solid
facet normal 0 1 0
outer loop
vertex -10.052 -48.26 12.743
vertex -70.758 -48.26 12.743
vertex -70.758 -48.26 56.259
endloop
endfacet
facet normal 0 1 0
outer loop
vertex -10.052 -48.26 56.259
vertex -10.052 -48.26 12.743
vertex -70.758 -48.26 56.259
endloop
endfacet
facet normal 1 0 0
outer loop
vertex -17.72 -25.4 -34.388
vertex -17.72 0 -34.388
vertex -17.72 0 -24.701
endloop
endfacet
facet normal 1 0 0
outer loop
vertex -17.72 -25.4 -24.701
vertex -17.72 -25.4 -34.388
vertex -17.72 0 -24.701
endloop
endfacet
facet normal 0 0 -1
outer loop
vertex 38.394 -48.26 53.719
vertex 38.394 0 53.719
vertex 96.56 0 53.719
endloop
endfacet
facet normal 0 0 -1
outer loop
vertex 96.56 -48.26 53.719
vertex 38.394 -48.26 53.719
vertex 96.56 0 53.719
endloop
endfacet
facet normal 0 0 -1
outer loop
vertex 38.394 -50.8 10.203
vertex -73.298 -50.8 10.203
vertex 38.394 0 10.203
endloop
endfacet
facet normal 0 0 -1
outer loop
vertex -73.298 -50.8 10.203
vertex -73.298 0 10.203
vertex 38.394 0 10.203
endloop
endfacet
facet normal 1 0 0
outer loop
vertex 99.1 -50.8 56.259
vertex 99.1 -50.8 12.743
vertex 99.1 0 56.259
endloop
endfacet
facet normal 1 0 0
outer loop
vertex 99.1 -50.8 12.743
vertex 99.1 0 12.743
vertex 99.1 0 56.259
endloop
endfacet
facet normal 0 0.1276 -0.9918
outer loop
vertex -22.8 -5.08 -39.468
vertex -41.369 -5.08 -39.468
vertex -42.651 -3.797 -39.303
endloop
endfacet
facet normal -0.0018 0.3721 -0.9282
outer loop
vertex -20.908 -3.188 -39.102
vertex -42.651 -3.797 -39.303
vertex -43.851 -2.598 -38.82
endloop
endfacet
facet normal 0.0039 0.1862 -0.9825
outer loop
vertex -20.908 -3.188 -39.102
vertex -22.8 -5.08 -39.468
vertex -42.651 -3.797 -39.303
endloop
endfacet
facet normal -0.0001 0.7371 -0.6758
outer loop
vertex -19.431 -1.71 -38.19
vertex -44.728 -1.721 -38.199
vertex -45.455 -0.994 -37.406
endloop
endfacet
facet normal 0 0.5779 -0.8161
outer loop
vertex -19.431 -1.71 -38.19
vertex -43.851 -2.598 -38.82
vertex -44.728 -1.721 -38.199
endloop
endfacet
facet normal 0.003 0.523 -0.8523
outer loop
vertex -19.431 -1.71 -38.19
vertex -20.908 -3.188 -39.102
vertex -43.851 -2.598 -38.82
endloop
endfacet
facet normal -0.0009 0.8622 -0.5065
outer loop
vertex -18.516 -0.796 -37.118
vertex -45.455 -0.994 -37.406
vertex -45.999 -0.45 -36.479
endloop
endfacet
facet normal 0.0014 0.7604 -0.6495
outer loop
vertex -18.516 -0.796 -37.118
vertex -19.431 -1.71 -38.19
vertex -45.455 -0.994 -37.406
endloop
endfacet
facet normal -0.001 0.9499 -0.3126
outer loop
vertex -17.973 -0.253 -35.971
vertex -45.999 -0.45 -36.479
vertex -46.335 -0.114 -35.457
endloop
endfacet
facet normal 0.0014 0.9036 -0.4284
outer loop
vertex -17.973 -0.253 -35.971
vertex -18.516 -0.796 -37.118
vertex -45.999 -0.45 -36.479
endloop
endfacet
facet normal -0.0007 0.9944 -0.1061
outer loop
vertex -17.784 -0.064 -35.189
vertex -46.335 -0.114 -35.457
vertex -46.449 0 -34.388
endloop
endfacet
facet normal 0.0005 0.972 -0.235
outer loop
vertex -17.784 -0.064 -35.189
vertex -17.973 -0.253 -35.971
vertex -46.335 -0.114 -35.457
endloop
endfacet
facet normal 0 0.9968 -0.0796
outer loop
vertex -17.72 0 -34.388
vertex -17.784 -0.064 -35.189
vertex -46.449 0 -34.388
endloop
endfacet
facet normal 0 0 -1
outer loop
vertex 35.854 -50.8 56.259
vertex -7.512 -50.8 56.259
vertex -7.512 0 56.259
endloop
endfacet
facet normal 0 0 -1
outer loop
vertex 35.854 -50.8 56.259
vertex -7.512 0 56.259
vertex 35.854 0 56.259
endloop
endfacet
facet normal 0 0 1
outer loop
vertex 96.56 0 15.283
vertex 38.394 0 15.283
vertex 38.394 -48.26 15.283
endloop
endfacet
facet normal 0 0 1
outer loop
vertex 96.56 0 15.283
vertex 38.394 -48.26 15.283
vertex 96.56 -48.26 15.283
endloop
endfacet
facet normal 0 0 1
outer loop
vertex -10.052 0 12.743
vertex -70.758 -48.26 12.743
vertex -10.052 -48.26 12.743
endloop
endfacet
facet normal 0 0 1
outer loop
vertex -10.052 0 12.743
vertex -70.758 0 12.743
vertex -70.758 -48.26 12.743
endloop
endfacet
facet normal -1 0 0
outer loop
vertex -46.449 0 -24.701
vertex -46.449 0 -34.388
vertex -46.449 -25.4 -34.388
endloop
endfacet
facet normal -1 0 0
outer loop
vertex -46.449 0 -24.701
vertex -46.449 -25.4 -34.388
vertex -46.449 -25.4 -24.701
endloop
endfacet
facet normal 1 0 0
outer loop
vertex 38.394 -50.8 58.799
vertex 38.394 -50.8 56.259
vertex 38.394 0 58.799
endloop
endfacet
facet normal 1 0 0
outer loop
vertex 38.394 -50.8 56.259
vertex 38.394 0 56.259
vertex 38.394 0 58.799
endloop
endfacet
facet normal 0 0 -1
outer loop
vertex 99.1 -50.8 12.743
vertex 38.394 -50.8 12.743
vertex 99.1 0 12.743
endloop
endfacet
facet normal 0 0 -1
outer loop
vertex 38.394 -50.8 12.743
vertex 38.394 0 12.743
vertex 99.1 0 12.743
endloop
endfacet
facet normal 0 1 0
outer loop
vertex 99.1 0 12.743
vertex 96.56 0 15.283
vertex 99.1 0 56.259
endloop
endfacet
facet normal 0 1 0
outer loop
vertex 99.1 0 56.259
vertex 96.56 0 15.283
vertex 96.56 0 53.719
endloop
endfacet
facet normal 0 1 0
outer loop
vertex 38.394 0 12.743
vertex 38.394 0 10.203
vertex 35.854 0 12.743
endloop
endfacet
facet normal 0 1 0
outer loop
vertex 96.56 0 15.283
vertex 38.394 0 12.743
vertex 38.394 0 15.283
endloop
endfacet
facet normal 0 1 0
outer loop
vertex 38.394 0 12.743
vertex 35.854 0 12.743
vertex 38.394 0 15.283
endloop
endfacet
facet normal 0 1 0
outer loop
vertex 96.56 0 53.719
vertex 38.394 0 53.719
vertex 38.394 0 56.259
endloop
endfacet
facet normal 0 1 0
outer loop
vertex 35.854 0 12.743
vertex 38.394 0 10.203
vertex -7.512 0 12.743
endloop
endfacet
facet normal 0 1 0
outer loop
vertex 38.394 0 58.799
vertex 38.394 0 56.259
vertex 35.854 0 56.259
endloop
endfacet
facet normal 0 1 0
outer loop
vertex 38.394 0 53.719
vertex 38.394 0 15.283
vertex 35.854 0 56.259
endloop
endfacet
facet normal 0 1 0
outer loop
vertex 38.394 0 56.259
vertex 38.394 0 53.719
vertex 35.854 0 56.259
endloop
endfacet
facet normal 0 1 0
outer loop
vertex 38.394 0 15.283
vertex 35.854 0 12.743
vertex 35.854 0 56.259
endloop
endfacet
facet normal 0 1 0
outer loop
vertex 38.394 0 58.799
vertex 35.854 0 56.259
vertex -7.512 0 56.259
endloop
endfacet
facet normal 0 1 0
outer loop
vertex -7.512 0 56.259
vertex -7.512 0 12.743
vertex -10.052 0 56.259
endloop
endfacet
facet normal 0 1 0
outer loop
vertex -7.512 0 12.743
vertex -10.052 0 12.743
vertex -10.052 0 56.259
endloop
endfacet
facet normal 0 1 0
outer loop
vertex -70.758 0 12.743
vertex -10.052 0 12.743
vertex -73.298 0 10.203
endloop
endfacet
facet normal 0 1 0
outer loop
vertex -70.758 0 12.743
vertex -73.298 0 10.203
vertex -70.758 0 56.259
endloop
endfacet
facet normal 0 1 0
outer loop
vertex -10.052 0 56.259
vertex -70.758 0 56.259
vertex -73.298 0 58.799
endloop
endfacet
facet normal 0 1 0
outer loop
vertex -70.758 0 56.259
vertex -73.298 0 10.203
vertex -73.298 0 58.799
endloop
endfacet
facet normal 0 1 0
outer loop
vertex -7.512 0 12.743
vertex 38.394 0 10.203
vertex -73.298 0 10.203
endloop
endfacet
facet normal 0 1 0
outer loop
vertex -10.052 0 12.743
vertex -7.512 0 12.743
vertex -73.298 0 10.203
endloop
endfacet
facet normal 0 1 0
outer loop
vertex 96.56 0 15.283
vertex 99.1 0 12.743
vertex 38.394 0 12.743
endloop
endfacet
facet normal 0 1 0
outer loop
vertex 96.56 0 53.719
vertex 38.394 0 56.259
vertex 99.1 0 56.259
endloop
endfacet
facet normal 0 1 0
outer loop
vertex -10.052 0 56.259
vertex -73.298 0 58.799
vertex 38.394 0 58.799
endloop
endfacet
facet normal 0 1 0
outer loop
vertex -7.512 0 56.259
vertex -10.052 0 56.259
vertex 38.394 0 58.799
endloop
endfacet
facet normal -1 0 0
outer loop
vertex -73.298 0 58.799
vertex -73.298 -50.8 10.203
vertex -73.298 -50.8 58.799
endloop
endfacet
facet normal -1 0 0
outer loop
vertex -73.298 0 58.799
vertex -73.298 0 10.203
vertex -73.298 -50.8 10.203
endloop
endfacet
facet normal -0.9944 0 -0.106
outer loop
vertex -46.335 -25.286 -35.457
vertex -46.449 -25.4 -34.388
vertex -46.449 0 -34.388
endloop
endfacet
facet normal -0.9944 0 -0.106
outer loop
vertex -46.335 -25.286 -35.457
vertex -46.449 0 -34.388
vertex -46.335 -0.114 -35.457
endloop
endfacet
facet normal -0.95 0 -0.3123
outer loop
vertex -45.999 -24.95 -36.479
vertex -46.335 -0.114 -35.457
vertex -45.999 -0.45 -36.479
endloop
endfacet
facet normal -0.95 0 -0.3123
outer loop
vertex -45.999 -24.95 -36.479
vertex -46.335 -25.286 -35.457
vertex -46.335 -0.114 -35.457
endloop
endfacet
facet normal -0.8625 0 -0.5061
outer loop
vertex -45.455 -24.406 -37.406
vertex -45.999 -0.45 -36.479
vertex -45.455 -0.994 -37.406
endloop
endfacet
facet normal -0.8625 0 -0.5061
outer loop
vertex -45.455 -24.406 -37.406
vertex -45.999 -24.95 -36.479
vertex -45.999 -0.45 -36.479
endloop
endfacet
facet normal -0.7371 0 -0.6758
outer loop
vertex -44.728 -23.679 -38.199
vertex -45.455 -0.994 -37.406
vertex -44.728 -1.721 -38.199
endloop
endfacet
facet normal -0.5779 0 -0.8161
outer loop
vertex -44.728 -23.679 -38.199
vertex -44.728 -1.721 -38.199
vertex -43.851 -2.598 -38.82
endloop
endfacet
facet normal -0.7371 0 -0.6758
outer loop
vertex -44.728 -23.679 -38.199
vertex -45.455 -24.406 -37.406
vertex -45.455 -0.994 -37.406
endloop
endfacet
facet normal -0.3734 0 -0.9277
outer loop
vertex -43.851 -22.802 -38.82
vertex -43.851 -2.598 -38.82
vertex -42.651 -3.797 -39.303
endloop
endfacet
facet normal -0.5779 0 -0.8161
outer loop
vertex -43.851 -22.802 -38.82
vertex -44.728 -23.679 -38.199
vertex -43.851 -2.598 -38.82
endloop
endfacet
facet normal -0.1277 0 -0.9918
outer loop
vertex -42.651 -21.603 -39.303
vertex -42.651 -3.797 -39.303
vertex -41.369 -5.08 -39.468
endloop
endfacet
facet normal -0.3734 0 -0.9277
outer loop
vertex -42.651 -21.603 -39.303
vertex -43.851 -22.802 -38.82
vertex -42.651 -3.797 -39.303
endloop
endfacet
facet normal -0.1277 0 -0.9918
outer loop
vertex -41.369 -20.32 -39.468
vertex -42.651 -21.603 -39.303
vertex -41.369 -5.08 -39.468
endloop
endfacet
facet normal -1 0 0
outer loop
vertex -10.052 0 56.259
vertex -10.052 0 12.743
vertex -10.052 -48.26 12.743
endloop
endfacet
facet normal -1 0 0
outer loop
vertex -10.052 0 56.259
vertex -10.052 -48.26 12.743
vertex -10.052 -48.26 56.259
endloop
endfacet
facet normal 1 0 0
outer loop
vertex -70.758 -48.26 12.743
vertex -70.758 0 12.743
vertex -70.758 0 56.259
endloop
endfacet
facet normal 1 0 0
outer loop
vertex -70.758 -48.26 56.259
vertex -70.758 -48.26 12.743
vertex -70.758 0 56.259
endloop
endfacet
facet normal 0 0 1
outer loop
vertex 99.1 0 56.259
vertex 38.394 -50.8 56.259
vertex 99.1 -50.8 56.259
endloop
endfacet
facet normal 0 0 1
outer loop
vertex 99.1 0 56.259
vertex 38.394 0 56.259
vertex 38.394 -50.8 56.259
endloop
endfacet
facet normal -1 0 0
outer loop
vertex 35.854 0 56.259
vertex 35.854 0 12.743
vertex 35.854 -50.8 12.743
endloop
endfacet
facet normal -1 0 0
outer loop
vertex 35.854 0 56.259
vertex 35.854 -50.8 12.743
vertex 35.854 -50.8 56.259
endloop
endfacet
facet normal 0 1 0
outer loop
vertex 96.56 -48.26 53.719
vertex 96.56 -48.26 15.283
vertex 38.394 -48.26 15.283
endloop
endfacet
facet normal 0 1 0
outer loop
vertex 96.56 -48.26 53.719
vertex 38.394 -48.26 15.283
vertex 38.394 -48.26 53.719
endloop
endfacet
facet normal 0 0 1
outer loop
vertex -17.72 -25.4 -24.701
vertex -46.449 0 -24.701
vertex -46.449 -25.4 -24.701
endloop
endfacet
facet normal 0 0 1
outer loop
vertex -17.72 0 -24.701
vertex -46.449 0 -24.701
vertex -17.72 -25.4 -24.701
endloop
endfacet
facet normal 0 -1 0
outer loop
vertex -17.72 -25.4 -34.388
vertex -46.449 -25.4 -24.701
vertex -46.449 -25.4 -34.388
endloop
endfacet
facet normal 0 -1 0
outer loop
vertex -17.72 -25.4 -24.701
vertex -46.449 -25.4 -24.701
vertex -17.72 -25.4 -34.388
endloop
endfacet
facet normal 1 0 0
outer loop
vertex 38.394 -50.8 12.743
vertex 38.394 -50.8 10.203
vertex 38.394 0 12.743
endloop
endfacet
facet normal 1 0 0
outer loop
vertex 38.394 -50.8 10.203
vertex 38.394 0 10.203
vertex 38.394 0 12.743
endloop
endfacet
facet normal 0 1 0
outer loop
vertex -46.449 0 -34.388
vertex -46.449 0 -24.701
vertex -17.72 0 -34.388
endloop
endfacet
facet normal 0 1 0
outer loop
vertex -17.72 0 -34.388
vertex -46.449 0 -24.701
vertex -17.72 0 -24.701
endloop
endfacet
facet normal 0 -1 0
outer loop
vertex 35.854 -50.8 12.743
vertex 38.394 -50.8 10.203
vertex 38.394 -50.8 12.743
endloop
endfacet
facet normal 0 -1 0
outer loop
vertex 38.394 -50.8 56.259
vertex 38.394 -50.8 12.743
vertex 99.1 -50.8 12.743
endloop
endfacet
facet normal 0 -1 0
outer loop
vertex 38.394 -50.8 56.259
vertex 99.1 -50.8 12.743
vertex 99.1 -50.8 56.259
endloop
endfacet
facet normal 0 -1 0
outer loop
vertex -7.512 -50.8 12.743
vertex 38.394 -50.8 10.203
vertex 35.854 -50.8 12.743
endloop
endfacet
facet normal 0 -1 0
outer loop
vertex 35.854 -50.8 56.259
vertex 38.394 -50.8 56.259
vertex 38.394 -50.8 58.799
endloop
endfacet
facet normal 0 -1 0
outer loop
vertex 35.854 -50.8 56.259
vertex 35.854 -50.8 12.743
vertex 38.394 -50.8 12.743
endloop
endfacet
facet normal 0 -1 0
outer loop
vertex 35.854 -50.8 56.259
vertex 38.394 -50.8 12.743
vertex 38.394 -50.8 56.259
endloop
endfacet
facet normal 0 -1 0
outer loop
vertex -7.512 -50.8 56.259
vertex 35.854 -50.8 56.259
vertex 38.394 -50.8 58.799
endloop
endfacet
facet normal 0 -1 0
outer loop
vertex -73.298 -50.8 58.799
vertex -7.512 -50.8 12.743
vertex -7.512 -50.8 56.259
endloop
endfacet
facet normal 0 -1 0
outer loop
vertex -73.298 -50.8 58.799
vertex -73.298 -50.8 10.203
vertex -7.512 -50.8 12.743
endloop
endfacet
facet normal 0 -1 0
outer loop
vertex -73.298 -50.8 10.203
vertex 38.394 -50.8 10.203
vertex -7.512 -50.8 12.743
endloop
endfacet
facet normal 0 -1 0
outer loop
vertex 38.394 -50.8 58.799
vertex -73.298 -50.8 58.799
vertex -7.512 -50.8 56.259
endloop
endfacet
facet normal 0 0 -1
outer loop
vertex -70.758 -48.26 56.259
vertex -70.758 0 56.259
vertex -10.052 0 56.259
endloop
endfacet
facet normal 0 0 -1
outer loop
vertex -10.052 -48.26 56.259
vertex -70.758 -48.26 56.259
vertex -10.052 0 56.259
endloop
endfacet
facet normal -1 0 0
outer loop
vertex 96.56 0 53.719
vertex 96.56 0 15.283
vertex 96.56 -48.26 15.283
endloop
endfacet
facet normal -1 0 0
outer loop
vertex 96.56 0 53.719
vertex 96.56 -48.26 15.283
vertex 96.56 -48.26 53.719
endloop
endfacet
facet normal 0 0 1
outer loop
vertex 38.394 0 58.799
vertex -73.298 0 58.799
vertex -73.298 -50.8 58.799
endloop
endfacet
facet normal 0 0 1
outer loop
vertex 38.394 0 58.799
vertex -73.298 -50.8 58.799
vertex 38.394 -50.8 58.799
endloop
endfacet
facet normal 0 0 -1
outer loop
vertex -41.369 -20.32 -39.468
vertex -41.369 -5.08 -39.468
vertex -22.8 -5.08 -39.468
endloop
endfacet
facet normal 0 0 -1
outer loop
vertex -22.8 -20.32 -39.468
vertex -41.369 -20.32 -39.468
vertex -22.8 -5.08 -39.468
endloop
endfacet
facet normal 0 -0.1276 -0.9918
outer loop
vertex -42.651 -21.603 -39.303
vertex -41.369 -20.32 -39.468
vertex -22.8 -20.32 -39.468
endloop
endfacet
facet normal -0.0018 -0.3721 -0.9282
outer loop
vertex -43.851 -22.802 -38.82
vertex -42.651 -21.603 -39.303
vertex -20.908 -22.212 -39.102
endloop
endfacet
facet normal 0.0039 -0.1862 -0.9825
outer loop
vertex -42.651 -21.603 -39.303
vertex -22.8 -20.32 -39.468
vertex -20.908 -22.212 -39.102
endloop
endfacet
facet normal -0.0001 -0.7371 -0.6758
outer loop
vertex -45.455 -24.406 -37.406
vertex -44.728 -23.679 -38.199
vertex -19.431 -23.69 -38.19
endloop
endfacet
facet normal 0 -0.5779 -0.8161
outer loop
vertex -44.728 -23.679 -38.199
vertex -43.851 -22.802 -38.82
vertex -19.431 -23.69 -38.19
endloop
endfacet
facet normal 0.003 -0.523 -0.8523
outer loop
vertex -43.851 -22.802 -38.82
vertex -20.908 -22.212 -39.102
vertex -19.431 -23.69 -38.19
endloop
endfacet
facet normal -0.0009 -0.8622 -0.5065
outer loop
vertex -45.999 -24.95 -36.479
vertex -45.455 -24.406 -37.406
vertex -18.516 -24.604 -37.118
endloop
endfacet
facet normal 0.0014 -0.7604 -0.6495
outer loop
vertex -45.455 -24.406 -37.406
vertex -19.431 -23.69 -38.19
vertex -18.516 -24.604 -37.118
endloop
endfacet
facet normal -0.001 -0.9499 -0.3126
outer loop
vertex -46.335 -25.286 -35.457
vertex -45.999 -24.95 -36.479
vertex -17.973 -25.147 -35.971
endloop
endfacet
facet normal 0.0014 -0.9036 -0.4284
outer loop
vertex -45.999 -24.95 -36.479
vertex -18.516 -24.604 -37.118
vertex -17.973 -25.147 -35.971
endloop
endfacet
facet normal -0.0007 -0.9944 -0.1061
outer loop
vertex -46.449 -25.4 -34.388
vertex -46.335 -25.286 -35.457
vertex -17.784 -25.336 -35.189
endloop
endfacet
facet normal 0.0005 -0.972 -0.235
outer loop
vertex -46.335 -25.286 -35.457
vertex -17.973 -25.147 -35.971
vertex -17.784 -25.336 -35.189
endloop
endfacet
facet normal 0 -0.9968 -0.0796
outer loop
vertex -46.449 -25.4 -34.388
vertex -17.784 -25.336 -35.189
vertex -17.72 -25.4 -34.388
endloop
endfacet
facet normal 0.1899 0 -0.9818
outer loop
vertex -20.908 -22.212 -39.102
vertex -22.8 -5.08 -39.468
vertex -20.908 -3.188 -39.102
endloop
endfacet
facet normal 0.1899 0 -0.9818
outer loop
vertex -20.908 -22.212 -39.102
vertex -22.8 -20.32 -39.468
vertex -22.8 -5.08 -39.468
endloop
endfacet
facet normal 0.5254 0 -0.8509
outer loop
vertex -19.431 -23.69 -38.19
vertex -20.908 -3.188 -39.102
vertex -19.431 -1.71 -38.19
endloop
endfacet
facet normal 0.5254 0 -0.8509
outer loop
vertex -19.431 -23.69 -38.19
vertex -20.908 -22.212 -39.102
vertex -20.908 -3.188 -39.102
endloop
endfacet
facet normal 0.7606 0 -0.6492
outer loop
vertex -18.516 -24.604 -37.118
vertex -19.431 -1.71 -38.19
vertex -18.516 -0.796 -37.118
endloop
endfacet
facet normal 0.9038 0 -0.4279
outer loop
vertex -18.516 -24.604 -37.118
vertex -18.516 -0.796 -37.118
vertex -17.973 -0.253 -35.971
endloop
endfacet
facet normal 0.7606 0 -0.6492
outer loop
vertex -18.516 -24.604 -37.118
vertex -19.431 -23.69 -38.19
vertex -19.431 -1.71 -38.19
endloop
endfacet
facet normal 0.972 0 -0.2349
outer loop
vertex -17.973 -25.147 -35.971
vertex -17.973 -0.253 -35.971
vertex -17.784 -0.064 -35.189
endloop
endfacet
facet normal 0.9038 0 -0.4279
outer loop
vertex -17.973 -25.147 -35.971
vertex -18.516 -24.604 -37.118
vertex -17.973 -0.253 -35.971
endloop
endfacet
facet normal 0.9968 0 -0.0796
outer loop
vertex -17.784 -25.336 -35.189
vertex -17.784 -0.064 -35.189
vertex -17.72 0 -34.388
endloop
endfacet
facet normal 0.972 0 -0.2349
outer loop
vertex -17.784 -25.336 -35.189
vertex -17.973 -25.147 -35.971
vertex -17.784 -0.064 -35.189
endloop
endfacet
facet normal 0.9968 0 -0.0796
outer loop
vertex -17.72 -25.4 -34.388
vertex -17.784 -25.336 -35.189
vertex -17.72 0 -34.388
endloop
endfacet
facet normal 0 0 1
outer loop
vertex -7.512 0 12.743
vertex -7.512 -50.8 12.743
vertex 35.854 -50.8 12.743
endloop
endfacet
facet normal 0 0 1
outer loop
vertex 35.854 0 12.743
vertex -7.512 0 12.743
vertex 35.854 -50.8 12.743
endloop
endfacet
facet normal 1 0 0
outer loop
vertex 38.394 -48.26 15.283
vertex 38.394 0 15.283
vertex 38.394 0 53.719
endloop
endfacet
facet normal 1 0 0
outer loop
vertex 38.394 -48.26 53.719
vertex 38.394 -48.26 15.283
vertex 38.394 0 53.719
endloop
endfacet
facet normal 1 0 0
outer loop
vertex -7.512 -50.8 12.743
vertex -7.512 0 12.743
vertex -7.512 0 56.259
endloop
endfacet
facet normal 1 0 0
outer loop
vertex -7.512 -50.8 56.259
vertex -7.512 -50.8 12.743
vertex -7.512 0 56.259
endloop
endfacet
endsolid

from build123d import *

# Parameters (mm, degrees)
F0_W        = 111.691813916
F0_H        = 48.596679233
F1_DEPTH    = 25.4
F0_W_2      = 28.7284236401
F0_H_2      = 14.766946435
F2_T        = -2.54
F3_DEPTH    = 63.246
F4_DEPTH    = 25.4
F5_T        = 2.54
F5_T3_DEPTH = 55.88
F6_R        = 5.08


# Not quite as in the source:
# - a shell that OpenCascade refuses in one call is made with other operations: the cavity is built on its own and cut out


with BuildPart() as f1:
    # F0 (on Front) → F1 (new body)
    with BuildSketch(Plane.XZ):
        with Locations((-17.4518469721, 34.500957001)):
            Rectangle(F0_W, F0_H)
    extrude(amount=F1_DEPTH)

    # F2
    f2_openings = [f1.faces().sort_by_distance(p)[0] for p in [
        (-17.451847, -25.4, 34.500957),
        (-17.451847, 0, 34.500957),
    ]]
    offset(amount=F2_T, openings=f2_openings)

    # F3 (add): faces of the model
    f3_faces = [f1.faces().sort_by_distance(p)[0] for p in [
        (-70.7577539301, -12.7, 34.500957001),
        (35.8540599859, -12.7, 34.500957001),
    ]]
    extrude(f3_faces, amount=F3_DEPTH, dir=(1, 0, 0))

    # F4 (add): a face of the model
    f4_faces = [f1.faces().sort_by_distance(p)[0] for p in [
        (36.602897138, -25.4, 57.5292966175),
    ]]
    extrude(f4_faces, amount=F4_DEPTH)

    # F5: shell of thickness 2.54, made by hand


with BuildPart() as f1b:
    # F0 (on Front) → F1, piece 2 (new body)
    with BuildSketch(Plane.XZ):
        with Locations((-32.0845479146, -32.0845469832)):
            Rectangle(F0_W_2, F0_H_2)
    extrude(amount=F1_DEPTH)

    # F6
    f6_edges = [f1b.edges().sort_by_distance(p)[0] for p in [
        (-46.44876, -12.7, -39.46802),
        (-17.720336, -12.7, -39.46802),
        (-32.084548, 0, -39.46802),
        (-32.084548, -25.4, -39.46802),
    ]]
    fillet(f6_edges, radius=F6_R)


with BuildPart() as f5_core1:
    # F5_t2: copy of F1
    add(f1.part)

    # the walls: a layer under each face that stays
    f5_faces = [f5_core1.faces().sort_by_distance(p)[0] for p in [
        (-17.4518469721, -25.4, 58.7992966175),
        (-7.5117539301, -25.4, 34.500957001),
        (14.1711530279, -25.4, 12.7426173845),
        (35.8540599859, -25.4, 34.500957001),
        (14.1711530279, -25.4, 56.2592966175),
        (68.7470599859, -25.4, 56.2592966175),
        (99.1000599859, -25.4, 34.500957001),
        (68.7470599859, -25.4, 12.7426173845),
        (38.3940599859, -25.4, 11.4726173845),
        (-17.4518469721, -25.4, 10.2026173845),
        (-73.2977539301, -25.4, 34.500957001),
        (-44.5647849441, -50.8, 18.3020639233),
        (38.3940599859, -25.4, 57.5292966175),
    ]]
    thicken(f5_faces, amount=-F5_T, mode=Mode.SUBTRACT)

    # F5_s4 → F5_t3 (cut)
    with BuildSketch(Plane.XZ.offset(-2.54)):
        Polygon((-7.4863539301, 56.2338966175), (-10.0517539301, 56.2592966175), (-10.0517539301, 58.7992966175), (-7.5117539301, 58.7992966175), align=None)
        Polygon((-7.4863539301, 12.7680173845), (-10.0517539301, 12.7426173845), (-10.0517539301, 10.2026173845), (-7.5117539301, 10.2026173845), align=None)
        Polygon((35.8286599859, 12.7680173845), (35.8540599859, 10.2026173845), (38.3940599859, 10.2026173845), (38.3940599859, 12.7426173845), align=None)
        Polygon((35.8286599859, 56.2338966175), (38.3940599859, 56.2592966175), (38.3940599859, 58.7992966175), (35.8540599859, 58.7992966175), align=None)
        Polygon((38.4194599859, 56.2846966175), (38.3940599859, 53.7192966175), (35.8540599859, 53.7192966175), (35.8540599859, 56.2592966175), align=None)
        Polygon((38.4194599859, 12.7172173845), (38.3940599859, 15.2826173845), (35.8540599859, 15.2826173845), (35.8540599859, 12.7426173845), align=None)
    extrude(amount=F5_T3_DEPTH, mode=Mode.SUBTRACT)


with BuildPart() as f1_1:
    add(f1.part)

    # what is left inside the walls is the cavity
    f5_cavity = [f5_core1.part.solids().sort_by_distance(p)[0] for p in [
        (77.171393, -24.13, 53.693897),
        (-40.404754, -32.173333, 56.233897),
    ]]
    add(f5_cavity, mode=Mode.SUBTRACT)


solid = Compound([f1b.part, f1_1.part])
